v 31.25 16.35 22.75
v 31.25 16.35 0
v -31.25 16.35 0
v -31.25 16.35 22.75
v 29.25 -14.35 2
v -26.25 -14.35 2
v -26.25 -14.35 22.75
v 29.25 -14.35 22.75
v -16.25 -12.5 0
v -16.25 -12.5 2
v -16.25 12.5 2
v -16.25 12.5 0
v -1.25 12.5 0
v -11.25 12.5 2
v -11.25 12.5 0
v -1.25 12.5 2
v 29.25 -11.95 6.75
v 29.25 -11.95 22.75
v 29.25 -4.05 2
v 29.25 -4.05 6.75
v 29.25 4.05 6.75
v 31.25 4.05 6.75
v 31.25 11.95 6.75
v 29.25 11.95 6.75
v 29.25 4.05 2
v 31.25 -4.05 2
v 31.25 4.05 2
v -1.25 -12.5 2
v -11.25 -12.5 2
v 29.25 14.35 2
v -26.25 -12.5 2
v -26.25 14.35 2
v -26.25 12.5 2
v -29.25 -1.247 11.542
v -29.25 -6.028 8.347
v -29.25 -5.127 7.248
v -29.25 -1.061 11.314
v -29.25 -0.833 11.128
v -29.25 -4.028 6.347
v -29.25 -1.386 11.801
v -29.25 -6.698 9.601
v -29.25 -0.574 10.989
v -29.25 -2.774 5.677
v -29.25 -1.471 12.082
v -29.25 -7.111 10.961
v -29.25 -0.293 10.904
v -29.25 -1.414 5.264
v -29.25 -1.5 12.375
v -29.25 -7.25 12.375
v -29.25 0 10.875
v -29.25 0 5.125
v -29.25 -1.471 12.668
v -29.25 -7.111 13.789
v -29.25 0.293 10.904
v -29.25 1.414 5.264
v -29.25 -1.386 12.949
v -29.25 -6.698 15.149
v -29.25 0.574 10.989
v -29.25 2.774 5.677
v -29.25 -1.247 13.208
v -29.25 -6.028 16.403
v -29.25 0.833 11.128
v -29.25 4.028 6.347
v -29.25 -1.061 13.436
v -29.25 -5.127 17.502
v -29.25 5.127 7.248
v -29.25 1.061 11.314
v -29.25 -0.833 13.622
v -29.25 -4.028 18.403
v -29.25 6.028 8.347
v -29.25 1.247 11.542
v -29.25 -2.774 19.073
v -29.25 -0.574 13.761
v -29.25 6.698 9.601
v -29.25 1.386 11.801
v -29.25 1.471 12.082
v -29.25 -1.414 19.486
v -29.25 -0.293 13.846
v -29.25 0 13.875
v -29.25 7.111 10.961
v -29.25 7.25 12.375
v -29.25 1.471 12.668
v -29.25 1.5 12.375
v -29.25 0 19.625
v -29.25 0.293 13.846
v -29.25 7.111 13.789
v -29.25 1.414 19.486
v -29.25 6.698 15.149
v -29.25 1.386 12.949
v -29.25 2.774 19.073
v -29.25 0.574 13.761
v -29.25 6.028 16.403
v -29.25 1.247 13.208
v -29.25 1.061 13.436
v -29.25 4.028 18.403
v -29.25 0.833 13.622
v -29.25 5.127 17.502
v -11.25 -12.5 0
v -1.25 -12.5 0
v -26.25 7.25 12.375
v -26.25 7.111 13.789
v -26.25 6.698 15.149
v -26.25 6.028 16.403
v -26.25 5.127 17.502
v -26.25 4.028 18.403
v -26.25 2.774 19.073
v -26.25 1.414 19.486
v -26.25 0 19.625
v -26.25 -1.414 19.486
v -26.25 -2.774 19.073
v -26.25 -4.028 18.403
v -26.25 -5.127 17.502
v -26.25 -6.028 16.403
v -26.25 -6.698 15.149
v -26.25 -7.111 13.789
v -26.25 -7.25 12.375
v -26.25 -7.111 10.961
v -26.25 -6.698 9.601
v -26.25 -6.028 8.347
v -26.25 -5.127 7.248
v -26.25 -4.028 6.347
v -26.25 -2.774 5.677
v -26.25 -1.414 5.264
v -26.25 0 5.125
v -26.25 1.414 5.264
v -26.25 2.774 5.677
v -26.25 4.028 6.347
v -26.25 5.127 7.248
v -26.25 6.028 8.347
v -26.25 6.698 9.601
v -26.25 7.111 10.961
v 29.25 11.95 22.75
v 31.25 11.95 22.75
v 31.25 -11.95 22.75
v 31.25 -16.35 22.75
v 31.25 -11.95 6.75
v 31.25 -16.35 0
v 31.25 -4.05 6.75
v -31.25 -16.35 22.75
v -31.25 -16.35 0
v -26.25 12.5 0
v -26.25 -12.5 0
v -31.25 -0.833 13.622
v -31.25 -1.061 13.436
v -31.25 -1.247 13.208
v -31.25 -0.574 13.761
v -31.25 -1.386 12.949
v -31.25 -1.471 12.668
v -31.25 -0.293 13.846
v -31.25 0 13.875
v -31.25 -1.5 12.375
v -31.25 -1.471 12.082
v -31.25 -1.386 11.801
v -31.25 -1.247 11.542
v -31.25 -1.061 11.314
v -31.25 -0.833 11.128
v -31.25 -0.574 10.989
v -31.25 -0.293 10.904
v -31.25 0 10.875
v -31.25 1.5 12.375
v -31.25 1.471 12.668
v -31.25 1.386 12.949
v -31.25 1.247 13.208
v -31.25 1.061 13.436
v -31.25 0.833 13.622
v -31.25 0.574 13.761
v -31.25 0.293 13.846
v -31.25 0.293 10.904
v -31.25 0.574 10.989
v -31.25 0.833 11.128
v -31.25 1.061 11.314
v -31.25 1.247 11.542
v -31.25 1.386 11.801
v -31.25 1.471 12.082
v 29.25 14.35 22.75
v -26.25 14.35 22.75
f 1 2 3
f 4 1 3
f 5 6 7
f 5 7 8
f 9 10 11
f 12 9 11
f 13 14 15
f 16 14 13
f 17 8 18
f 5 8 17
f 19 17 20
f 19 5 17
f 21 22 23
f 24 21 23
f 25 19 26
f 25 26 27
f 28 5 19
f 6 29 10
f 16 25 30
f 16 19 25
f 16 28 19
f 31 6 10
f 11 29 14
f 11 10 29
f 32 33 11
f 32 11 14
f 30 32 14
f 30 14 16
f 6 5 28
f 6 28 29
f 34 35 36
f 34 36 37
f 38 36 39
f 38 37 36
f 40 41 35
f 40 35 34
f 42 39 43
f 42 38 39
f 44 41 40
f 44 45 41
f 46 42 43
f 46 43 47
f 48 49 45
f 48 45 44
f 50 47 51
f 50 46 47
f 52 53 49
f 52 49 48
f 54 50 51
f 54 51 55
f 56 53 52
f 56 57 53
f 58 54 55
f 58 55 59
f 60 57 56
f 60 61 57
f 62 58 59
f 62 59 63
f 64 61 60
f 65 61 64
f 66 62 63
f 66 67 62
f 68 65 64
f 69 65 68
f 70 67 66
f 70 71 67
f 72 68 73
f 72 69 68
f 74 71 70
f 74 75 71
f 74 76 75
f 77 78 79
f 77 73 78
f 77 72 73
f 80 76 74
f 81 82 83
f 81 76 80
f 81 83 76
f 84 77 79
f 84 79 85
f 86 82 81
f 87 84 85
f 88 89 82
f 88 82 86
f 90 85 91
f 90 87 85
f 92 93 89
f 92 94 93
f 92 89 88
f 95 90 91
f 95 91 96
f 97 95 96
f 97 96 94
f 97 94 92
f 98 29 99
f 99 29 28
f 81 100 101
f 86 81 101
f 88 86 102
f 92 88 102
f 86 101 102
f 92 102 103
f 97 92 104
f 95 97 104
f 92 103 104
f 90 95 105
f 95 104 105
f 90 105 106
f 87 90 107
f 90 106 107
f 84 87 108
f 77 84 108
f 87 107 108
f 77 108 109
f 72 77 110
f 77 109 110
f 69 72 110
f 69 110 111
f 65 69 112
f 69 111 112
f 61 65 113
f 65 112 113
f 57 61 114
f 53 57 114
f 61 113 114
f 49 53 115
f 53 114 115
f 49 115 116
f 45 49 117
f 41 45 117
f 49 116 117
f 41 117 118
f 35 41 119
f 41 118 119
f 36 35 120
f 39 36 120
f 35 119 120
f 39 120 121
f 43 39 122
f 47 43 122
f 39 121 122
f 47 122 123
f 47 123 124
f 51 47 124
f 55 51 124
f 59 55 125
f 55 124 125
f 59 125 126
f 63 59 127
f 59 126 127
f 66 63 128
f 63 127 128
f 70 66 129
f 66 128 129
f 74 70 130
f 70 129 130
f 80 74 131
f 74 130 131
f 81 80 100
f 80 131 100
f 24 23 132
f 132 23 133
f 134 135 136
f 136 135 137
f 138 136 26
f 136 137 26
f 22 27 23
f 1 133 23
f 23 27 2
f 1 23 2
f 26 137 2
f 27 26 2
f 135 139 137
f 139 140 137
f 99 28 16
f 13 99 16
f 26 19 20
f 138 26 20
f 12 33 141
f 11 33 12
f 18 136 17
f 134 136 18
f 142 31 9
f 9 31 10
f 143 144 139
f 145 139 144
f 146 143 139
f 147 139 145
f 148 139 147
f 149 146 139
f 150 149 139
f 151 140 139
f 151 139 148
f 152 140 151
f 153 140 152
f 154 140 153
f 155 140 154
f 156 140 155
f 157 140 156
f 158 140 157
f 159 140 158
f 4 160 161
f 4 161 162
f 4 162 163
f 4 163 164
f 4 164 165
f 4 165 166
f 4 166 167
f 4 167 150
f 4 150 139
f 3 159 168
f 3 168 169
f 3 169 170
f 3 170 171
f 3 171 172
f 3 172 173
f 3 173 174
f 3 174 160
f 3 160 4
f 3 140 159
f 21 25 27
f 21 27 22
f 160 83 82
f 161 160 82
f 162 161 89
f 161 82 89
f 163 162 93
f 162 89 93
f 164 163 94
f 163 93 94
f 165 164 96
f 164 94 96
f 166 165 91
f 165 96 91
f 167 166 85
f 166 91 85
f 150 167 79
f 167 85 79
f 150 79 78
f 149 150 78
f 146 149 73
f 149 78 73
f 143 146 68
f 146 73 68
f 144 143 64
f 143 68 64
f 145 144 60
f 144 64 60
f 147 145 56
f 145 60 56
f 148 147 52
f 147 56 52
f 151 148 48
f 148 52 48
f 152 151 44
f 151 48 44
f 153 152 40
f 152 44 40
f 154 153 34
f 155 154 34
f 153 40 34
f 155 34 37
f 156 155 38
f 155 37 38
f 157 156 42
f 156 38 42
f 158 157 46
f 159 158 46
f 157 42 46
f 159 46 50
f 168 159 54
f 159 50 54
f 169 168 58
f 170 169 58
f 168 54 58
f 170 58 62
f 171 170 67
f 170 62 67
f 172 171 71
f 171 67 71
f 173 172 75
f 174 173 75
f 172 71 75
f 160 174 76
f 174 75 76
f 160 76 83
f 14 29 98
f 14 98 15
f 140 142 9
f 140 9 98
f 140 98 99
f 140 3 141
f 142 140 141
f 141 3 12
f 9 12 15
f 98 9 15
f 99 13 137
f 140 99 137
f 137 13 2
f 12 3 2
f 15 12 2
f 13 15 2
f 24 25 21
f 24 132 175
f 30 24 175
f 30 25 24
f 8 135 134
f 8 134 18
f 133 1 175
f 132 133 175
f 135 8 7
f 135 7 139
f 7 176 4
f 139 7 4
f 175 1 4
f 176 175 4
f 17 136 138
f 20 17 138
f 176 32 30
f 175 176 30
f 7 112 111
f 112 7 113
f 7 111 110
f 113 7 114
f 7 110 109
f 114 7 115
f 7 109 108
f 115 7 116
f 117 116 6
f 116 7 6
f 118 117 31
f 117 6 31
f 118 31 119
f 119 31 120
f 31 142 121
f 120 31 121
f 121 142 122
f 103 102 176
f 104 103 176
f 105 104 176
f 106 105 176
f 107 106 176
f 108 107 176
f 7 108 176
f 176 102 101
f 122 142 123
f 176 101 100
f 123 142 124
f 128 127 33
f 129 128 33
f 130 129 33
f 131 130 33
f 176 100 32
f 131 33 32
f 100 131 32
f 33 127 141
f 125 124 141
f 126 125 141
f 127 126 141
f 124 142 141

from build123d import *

# Parameters (mm, degrees)
SKETCH008_W     = 62.5
SKETCH008_H     = 32.7
PAD007_DEPTH    = 2
SKETCH009_W     = 55.5
SKETCH009_H     = 28.7
PAD008_DEPTH    = 20.75
SKETCH010_R     = 7.25
POCKET001_DEPTH = 3
SKETCH011_R     = 1.5
POCKET002_DEPTH = 2
SKETCH012_W     = 23.9
SKETCH012_H     = 16
POCKET003_DEPTH = 2
SKETCH017_W     = 8.1
SKETCH017_H     = 4.75
POCKET004_DEPTH = 40
SKETCH018_W     = 10
SKETCH018_H     = 25
POCKET005_DEPTH = 2


with BuildPart() as part:
    # Sketch008 → Pad007 (new body)
    with BuildSketch(Plane.XY):
        Rectangle(SKETCH008_W, SKETCH008_H)
    extrude(amount=PAD007_DEPTH)

    # Sketch009 (on Face6 of Pad007) → Pad008 (join)
    with BuildSketch(Plane.XY.offset(2)):
        Polygon((-31.25, 16.35), (-26.25, 16.35), (31.25, 16.35), (31.25, 14.35), (31.25, -14.35), (31.25, -16.35), (-26.25, -16.35), (-31.25, -16.35), align=None)
        with Locations((1.5, 0)):
            Rectangle(SKETCH009_W, SKETCH009_H, mode=Mode.SUBTRACT)
    extrude(amount=PAD008_DEPTH)

    # Sketch010 (on Face15 of Pad008) → Pocket001 (cut)
    with BuildSketch(Plane.YZ.offset(-26.25)):
        with Locations((0, 12.375)):
            Circle(SKETCH010_R)
    extrude(amount=-POCKET001_DEPTH, mode=Mode.SUBTRACT)

    # Sketch011 (on Face21 of Pocket001) → Pocket002 (cut)
    with BuildSketch(Plane.YZ.offset(-29.25)):
        with Locations((0, 12.375)):
            Circle(SKETCH011_R)
    extrude(amount=-POCKET002_DEPTH, mode=Mode.SUBTRACT)

    # Sketch012 (on Face10 of Pocket002) → Pocket003 (cut)
    with BuildSketch(Plane.YZ.offset(31.25)):
        with Locations((0, 14.75)):
            Rectangle(SKETCH012_W, SKETCH012_H)
    extrude(amount=-POCKET003_DEPTH, mode=Mode.SUBTRACT)

    # Sketch017 → Pocket004 (cut)
    with BuildSketch(Plane.YZ):
        with Locations((0, 4.375)):
            Rectangle(SKETCH017_W, SKETCH017_H)
    extrude(amount=POCKET004_DEPTH, mode=Mode.SUBTRACT)

    # Sketch018 (on Face19 of Pad008) → Pocket005 (cut)
    with BuildSketch(Plane.XY.offset(2)):
        with Locations((-21.25, 0)):
            Rectangle(SKETCH018_W, SKETCH018_H)
        with Locations((-6.25, 0)):
            Rectangle(SKETCH018_W, SKETCH018_H)
    extrude(amount=-POCKET005_DEPTH, mode=Mode.SUBTRACT)


solid = part.part
